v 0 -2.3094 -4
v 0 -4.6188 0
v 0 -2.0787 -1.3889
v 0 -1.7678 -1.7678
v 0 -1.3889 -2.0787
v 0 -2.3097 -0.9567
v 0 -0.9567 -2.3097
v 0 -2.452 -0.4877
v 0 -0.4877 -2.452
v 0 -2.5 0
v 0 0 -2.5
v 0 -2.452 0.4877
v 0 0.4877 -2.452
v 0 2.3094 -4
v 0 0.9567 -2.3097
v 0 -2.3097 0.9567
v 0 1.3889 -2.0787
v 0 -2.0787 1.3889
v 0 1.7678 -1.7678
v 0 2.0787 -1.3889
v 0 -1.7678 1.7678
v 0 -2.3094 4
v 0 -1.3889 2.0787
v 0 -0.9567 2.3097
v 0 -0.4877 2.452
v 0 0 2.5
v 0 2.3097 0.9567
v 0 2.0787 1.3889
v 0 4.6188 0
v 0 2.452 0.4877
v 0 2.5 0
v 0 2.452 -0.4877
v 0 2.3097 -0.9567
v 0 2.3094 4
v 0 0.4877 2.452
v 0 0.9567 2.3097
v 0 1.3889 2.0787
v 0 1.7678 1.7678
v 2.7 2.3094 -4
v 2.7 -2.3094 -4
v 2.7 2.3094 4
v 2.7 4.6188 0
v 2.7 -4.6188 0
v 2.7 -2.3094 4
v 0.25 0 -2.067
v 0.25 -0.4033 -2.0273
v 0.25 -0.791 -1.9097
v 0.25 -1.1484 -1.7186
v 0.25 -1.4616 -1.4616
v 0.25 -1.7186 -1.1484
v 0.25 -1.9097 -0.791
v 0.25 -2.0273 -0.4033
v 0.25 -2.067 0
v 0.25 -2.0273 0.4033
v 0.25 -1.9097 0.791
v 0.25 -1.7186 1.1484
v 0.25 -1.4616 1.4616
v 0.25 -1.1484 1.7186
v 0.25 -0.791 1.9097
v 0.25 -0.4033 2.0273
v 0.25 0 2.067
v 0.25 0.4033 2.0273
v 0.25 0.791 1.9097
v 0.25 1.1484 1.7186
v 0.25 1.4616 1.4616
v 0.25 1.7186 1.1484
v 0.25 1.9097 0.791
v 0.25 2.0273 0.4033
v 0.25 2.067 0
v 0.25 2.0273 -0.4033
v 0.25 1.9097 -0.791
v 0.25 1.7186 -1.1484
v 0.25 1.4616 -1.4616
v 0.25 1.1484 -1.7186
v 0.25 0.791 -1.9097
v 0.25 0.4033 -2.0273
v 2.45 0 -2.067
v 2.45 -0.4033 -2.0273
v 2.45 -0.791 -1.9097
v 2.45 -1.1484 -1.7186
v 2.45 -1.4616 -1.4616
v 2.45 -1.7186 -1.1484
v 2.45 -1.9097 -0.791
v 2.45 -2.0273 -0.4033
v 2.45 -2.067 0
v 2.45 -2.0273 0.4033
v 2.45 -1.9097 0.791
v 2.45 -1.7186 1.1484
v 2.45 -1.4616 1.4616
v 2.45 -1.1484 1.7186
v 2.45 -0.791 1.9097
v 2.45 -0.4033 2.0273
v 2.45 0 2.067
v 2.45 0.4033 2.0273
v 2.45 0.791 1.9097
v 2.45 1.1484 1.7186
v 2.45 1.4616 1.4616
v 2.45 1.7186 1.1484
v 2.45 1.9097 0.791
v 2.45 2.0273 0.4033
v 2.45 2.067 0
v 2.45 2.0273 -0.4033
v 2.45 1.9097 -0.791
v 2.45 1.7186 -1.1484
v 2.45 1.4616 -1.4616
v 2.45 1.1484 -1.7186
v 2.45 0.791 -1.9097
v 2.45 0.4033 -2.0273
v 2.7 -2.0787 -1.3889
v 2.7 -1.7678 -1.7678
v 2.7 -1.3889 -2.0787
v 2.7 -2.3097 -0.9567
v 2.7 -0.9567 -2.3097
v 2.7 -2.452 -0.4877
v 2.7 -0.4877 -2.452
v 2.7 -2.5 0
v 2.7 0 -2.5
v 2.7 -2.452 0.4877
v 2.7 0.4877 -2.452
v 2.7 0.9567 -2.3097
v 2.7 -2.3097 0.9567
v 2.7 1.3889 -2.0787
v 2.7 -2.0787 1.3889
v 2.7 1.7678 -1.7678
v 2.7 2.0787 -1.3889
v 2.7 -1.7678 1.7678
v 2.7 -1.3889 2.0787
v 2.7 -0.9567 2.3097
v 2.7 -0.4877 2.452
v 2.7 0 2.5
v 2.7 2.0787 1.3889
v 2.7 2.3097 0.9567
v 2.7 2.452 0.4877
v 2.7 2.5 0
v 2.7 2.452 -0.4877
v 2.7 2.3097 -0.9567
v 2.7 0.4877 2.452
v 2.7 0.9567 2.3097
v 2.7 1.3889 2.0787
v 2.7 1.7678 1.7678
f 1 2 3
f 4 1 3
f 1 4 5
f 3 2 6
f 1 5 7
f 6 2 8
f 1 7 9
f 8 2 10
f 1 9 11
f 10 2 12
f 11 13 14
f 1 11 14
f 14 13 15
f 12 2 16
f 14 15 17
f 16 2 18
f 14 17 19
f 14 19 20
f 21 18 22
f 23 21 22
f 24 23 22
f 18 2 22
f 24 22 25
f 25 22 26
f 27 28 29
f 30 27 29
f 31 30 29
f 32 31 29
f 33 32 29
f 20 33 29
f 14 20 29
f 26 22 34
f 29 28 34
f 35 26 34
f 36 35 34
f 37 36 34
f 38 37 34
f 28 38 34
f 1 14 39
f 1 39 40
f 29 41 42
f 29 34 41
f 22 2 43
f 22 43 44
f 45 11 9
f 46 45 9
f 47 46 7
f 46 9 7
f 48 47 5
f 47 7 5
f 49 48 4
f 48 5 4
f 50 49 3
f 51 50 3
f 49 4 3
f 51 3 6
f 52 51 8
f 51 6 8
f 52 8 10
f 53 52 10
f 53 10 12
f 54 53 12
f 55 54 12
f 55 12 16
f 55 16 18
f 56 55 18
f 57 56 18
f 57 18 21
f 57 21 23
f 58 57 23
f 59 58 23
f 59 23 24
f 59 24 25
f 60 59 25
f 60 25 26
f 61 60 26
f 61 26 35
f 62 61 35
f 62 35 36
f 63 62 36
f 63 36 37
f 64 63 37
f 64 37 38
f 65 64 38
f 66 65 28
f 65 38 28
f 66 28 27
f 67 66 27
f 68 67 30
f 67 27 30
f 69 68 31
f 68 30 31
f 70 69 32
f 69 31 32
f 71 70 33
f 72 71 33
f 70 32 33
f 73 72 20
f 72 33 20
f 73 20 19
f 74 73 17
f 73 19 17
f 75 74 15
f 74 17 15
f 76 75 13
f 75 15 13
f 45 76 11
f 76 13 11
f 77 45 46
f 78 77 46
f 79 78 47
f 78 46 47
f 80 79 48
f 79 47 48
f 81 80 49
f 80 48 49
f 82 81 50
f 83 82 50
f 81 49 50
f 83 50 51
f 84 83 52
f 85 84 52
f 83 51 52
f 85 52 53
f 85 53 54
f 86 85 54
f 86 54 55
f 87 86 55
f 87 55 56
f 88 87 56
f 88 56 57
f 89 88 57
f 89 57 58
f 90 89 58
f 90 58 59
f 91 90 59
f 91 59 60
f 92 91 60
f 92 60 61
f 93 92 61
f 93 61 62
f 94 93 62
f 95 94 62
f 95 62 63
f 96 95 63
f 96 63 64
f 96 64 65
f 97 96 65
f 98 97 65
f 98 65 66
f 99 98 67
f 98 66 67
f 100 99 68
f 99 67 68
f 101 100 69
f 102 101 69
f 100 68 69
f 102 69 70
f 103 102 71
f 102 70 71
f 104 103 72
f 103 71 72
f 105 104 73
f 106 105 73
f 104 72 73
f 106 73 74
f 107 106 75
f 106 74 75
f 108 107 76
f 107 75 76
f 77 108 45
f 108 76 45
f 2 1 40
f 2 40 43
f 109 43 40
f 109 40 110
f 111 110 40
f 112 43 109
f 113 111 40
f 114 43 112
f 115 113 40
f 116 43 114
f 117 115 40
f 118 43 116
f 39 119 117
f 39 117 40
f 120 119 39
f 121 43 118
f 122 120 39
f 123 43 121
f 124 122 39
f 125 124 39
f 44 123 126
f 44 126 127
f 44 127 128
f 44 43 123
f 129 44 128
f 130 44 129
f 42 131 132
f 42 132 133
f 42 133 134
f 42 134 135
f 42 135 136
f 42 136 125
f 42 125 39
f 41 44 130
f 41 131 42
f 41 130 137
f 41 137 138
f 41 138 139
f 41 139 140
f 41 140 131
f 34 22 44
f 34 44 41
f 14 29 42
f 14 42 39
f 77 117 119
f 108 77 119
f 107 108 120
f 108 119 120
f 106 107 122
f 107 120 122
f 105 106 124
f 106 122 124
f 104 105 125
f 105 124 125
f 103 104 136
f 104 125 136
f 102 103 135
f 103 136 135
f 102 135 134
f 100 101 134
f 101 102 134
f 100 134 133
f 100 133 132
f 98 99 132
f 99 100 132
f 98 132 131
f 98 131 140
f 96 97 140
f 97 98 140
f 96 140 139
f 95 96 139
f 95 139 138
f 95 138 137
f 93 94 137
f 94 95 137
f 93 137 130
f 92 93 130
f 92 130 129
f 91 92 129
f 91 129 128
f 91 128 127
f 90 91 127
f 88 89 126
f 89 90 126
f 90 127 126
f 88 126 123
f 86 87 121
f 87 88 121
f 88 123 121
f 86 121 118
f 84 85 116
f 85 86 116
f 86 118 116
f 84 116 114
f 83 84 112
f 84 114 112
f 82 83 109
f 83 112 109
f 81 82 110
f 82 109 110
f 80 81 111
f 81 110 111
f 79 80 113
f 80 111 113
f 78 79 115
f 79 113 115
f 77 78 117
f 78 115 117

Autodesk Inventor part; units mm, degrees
ref_plane "YZ Plane" through (0, 0, 0) normal (1, 0, 0) x (0, 1, 0)
ref_plane "XZ Plane" through (0, 0, 0) normal (0, 1, 0) x (-1, 0, 0)
sketch "Boceto1" plane through (0, 0, 0) normal (1, 0, 0) x (0, 1, 0)
  line L0 (2.3094, -4) -> (-2.3094, -4)
  line L1 (-2.3094, -4) -> (-4.6188, 0)
  line L2 (-4.6188, 0) -> (-2.3094, 4)
  line L3 (-2.3094, 4) -> (2.3094, 4)
  line L4 (2.3094, 4) -> (4.6188, 0)
  line L5 (4.6188, 0) -> (2.3094, -4)
  point P0 (0, 0)
  point P1 (0, 0)
  dimension "d0" = 9.2376
extrude "Cuerpo" add sketch "Boceto1" along normal blind 2.7
sketch "Boceto2" plane through (2.7, 0, 0) normal (1, 0, 0) x (0, 0, -1)
  point P0 (0, 0)
hole "Rosca" at (2.7, 0, 0) direction (-1, 0, 0) diameter 4.134 end through all thread size "M5x0.8" class "6H" standard "ISO Metric profile"
chamfer "Chaflán2" distance 0.433 angle 30 1 edges at (2.7, 0, 2.067) measured on face at (2.7, 2.8764, -1.7247)
chamfer "Chaflán1" distance 0.433 angle 30 1 edges at (0, 0, 2.067) measured on face at (0, 2.8764, -1.7247)
ref_plane "Work Plane1" through (-9.8149, 0, 0) normal (0, 0, -1) x (1, 0, 0)
equation "\"d0\" = 1.1547 * SW"
equation "\"d1\" = KOH"
equation "\"d12\" = -0.5 * GD1 + 0.5 * NND"
equation "\"d19\" = -0.5 * GD1 + 0.5 * NND"
equation "\"d10\" = -0.5 * GD1 + 0.5 * NND"
equation "\"d18\" = -0.5 * GD1 + 0.5 * NND"
equation "\"NND\" = 5"
equation "\"KOH\" = 2.7"
equation "\"SW\" = 8"
equation "\"GUL\" = 0.541266 * PTC"
equation "\"THREADDIA\" = 5"
equation "\"TOA\" = 30deg"
equation "\"PTC\" = 0.8"
equation "\"E0\" = 1.155 * SW"
equation "\"GAL\" = 0.541266 * PTC"
equation "\"GD1\" = 4.133975"
properties part number "AS 1474 - M5" material "Acero, suave"
